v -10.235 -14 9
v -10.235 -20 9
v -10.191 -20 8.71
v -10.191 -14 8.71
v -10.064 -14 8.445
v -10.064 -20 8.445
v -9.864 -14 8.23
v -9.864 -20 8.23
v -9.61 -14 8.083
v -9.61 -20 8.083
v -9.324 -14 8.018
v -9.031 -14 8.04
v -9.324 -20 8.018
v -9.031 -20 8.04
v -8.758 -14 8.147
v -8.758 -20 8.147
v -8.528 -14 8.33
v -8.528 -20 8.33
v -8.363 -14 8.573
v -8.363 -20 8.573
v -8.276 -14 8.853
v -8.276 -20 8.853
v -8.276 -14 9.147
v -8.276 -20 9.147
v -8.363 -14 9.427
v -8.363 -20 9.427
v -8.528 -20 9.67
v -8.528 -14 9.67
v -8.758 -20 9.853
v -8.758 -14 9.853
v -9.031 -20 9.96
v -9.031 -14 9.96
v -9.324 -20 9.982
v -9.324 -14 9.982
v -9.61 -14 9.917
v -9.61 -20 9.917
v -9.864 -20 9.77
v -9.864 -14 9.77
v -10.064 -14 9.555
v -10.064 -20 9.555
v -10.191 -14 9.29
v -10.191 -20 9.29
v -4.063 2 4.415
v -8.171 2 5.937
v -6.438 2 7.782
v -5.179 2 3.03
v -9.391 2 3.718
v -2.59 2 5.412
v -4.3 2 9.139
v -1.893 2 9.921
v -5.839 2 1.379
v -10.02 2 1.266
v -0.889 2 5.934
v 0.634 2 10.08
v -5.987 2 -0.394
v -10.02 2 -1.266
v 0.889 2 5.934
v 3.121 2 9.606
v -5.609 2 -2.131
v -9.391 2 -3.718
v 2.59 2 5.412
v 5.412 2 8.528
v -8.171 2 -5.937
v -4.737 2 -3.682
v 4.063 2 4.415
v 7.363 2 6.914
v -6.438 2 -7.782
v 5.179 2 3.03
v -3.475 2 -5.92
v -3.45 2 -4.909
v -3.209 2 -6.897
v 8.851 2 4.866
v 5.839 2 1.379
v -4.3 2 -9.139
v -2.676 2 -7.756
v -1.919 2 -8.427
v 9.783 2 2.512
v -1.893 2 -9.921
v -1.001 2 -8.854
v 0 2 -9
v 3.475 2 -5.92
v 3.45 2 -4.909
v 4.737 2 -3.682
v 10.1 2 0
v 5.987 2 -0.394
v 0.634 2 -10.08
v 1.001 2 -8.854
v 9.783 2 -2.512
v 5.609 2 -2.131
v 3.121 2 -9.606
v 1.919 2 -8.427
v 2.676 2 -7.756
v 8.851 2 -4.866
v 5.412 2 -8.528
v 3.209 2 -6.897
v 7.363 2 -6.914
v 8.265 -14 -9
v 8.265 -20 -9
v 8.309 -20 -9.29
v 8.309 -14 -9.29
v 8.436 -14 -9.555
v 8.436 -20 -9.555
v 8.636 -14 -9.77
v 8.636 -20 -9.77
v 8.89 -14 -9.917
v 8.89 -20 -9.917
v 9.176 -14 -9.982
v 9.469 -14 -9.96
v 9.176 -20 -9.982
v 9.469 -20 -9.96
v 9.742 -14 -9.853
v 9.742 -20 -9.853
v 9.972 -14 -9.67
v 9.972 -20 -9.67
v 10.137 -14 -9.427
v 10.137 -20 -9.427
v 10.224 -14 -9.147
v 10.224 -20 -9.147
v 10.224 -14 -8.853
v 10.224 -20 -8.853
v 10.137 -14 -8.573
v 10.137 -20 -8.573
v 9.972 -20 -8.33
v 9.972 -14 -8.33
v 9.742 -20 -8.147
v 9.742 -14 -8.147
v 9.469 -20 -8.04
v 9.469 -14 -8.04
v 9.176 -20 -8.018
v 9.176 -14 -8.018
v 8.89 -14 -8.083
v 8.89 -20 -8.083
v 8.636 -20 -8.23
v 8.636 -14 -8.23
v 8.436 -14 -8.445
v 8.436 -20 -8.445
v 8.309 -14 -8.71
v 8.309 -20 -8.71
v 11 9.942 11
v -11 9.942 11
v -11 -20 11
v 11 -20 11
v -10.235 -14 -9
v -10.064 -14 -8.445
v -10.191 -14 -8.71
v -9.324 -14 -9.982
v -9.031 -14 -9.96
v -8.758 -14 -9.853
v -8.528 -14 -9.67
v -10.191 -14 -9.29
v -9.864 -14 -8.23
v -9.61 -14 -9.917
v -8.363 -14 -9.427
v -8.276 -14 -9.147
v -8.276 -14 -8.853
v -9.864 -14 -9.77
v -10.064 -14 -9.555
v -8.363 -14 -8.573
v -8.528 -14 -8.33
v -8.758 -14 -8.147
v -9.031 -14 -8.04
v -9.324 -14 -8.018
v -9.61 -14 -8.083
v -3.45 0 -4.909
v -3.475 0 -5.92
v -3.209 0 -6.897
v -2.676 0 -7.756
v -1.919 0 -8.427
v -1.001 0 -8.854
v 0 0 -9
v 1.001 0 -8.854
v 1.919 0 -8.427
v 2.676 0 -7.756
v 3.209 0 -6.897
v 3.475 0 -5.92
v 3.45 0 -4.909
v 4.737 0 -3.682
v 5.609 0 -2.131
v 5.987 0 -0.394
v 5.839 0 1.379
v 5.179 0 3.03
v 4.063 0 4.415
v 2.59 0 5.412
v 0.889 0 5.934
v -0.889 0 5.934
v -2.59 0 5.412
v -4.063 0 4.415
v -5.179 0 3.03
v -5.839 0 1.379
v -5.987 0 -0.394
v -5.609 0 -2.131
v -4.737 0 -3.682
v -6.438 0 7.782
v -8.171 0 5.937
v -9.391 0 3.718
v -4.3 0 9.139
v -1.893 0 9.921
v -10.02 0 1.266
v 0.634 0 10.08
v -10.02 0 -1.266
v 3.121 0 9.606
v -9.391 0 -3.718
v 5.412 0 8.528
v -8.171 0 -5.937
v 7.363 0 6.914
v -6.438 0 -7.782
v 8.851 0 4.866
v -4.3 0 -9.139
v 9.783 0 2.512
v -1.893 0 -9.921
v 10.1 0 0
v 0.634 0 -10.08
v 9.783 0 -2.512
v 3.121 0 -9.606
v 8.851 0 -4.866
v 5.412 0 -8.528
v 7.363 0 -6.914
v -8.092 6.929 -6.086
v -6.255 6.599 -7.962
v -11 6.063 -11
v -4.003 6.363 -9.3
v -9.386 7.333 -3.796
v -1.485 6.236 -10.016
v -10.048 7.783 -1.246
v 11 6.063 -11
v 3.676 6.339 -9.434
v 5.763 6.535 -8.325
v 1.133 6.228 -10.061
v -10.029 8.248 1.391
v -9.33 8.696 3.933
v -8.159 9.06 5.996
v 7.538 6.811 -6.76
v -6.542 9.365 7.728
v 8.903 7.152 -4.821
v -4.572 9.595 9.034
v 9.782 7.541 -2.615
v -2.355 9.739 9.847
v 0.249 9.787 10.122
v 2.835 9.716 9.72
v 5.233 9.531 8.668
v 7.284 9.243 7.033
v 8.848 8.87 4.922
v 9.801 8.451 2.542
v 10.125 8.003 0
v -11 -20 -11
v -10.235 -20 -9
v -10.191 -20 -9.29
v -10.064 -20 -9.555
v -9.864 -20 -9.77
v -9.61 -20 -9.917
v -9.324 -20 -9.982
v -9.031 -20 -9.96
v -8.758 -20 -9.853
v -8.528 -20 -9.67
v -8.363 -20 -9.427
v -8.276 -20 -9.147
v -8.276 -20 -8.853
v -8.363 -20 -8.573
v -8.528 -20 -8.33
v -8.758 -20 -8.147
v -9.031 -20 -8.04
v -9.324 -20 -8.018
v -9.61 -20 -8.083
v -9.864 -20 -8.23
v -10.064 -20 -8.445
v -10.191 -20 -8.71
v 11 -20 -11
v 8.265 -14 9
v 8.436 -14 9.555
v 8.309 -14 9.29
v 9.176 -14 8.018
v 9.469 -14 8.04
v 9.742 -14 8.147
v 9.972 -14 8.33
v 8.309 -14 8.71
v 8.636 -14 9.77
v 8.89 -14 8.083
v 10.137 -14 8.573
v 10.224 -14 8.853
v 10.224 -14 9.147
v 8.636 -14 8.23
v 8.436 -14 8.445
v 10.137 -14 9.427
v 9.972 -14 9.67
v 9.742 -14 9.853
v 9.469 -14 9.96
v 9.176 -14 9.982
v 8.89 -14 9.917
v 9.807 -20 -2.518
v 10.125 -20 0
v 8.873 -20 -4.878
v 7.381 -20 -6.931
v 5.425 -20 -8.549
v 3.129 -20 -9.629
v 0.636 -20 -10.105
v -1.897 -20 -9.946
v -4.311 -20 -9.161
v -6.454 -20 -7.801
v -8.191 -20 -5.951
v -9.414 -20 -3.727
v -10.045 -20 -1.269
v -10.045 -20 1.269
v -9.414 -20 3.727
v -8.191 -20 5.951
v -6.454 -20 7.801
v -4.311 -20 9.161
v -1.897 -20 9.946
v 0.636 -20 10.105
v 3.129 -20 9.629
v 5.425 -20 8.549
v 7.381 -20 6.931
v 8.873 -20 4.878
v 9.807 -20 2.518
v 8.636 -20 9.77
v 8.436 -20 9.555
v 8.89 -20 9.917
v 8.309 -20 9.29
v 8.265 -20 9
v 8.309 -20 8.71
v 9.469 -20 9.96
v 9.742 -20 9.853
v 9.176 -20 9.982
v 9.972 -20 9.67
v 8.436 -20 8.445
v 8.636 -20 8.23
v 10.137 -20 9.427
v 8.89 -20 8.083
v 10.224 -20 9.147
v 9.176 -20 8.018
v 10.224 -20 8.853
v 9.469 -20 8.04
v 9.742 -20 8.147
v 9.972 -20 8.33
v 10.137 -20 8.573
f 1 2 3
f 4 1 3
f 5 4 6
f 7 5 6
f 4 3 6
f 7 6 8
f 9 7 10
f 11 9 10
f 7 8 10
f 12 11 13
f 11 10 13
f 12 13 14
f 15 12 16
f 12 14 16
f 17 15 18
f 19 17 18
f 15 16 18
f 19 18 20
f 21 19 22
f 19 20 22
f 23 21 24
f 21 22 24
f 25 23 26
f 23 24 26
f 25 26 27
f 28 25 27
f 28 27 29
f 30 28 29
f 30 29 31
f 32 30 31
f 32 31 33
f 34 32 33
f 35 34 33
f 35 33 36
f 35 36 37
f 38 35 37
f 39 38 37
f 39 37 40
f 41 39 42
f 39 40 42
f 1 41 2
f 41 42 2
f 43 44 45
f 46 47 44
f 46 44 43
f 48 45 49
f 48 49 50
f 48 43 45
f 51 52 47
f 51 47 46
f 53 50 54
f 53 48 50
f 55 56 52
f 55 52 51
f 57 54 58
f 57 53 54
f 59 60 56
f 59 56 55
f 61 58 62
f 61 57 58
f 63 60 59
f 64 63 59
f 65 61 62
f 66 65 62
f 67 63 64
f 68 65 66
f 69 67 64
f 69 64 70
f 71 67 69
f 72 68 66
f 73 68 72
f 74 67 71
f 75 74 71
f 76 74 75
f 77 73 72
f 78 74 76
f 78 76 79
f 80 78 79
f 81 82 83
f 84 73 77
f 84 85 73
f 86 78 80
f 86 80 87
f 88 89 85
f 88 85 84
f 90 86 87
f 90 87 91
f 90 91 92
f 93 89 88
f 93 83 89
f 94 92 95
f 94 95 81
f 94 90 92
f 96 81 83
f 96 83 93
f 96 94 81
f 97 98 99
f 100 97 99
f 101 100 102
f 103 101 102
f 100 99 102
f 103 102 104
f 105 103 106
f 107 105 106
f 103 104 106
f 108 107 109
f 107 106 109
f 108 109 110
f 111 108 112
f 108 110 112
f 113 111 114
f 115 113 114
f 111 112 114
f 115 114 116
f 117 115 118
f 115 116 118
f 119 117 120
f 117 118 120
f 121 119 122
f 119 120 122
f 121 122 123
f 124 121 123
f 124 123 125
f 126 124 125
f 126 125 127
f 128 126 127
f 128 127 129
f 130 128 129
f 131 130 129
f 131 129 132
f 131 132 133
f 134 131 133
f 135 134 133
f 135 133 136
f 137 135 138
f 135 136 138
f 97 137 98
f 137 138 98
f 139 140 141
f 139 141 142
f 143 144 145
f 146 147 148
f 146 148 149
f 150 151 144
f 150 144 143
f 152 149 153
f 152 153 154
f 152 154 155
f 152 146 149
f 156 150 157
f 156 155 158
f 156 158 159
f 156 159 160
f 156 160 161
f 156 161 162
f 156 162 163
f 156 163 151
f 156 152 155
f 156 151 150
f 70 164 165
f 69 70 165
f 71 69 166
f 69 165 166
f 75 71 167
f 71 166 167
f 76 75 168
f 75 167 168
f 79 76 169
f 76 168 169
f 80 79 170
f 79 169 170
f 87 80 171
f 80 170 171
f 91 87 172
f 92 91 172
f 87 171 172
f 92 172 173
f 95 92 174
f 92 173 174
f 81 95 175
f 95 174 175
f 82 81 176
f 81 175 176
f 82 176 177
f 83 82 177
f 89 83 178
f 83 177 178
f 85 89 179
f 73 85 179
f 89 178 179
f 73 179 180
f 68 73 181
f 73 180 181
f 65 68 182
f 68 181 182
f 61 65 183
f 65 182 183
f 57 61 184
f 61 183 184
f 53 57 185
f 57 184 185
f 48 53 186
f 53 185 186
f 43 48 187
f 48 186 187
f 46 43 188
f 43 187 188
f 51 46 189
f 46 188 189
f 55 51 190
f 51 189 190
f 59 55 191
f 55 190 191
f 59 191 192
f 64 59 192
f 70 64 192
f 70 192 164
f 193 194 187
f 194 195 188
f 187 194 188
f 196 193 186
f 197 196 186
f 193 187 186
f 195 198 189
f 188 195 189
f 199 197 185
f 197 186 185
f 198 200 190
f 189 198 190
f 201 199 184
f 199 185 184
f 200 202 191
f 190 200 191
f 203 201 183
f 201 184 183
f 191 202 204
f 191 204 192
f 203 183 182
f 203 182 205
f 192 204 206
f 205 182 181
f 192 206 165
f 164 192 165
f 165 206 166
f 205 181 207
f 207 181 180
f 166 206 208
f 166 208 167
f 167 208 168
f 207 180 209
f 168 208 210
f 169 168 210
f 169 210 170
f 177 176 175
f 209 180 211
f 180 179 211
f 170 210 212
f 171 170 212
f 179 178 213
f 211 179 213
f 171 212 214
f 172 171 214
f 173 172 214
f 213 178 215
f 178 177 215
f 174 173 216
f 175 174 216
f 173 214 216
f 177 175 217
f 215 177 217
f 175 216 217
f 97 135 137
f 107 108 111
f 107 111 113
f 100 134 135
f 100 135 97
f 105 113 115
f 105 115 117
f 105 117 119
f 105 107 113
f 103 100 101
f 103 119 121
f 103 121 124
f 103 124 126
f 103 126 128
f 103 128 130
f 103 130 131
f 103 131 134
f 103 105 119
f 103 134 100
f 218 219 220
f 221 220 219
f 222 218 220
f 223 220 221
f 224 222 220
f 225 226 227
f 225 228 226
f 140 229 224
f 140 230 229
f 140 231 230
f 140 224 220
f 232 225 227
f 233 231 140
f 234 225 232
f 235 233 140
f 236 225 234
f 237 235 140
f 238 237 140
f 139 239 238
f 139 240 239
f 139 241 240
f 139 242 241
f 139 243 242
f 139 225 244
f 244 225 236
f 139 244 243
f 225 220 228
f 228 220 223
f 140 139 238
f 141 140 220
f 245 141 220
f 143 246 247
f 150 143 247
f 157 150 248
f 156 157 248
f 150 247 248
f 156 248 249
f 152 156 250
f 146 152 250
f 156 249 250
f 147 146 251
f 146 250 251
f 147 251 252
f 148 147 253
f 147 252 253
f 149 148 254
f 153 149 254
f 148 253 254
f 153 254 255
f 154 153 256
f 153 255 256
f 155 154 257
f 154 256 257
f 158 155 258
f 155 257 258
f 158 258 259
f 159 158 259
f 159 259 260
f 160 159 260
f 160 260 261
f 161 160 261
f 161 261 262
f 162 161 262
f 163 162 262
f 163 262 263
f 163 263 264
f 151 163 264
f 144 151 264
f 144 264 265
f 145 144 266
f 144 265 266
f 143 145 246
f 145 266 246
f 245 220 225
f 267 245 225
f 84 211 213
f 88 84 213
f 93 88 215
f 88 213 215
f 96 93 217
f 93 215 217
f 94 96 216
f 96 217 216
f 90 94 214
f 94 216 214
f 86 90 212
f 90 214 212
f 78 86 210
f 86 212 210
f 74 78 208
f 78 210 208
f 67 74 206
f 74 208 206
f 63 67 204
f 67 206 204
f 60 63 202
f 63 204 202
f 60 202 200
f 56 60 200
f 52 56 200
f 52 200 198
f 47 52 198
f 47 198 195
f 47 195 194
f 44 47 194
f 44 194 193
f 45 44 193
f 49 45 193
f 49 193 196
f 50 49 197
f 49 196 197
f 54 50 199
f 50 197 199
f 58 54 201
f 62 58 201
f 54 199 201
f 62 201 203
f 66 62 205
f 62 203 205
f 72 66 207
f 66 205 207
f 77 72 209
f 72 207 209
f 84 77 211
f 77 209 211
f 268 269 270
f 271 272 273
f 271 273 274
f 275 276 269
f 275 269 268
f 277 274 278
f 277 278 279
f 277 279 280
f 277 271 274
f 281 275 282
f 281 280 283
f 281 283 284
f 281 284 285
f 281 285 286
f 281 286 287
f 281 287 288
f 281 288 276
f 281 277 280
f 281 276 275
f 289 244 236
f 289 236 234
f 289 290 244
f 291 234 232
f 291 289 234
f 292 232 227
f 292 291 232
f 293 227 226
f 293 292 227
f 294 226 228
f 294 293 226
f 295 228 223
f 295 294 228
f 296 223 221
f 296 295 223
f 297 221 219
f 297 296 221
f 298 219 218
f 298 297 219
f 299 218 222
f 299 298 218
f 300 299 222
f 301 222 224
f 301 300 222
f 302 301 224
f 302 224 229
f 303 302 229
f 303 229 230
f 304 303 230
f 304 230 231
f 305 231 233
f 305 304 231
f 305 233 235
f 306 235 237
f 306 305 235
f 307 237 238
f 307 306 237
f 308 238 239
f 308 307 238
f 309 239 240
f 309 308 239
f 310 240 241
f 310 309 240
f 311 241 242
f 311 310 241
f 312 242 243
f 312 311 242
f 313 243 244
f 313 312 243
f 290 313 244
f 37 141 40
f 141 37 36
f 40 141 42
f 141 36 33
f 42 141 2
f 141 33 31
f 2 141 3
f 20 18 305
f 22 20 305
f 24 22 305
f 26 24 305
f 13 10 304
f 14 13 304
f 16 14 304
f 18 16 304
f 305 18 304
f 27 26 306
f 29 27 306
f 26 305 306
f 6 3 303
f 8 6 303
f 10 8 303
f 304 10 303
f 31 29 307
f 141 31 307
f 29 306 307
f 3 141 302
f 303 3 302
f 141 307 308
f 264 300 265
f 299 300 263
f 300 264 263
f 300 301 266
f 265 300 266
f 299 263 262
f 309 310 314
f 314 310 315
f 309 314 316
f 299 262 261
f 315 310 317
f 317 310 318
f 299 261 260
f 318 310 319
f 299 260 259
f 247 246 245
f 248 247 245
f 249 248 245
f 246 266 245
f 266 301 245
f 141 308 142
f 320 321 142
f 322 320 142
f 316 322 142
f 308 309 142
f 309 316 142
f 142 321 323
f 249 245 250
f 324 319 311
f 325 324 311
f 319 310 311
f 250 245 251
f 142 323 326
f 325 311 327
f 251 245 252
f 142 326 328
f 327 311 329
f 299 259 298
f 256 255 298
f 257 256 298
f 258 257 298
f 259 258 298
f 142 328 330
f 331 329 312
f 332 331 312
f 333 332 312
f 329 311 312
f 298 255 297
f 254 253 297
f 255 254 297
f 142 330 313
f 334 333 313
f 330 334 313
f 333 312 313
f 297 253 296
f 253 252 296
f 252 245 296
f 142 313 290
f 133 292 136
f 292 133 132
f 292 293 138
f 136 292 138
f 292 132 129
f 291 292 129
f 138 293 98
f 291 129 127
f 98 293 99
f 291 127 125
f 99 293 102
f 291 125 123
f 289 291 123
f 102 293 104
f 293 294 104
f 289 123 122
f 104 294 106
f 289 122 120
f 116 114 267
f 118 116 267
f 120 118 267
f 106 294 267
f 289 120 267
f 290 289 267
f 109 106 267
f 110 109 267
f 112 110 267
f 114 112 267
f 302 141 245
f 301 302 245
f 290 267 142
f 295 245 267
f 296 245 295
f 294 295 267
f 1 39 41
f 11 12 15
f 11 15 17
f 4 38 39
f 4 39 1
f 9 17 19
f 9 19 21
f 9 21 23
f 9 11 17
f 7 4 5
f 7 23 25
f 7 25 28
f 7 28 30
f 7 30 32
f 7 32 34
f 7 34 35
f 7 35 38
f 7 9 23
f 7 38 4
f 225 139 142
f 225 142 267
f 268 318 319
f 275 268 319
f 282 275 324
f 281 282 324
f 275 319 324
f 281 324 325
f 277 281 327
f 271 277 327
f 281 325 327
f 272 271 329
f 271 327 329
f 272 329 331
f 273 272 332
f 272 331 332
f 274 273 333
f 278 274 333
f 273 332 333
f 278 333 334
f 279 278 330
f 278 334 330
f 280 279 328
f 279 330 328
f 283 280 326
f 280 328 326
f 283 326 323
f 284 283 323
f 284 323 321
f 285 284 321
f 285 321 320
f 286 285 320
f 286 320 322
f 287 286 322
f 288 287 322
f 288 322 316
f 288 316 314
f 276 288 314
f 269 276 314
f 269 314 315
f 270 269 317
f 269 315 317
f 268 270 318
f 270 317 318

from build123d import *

# Parameters (mm, degrees)
SKETCH2_R                = 10.1
BOSS_EXTRUDE1_DEPTH      = 2
SKETCH3_W                = 22
SKETCH3_H                = 22
SKETCH3_R                = 10.125
BOSS_EXTRUDE2_DEPTH      = 8
BOSS_EXTRUDE2_DEPTH_BACK = 22
SKETCH5_R                = 0.985
CUT_EXTRUDE2_DEPTH       = 6
CUT_EXTRUDE3_DEPTH       = 23


with BuildPart() as part:
    # Sketch2 → Boss-Extrude1 (new body)
    with BuildSketch(Plane(origin=(0, 0, 0), x_dir=(1, 0, 0), z_dir=(0, 1, 0))):
        Circle(SKETCH2_R)
        with BuildLine():
            ThreePointArc((-3.449757447, 4.909090909), (0, 9), (3.449757447, 4.909090909))
            ThreePointArc((3.449757447, 4.909090909), (0, -6), (-3.449757447, 4.909090909))
        make_face(mode=Mode.SUBTRACT)
    extrude(amount=BOSS_EXTRUDE1_DEPTH)


with BuildPart() as body_2:
    # Sketch3 → Boss-Extrude2 (new body, two sides)
    with BuildSketch(Plane(origin=(0, 2, 0), x_dir=(1, 0, 0), z_dir=(0, 1, 0))) as boss_extrude2_sk:
        Rectangle(SKETCH3_W, SKETCH3_H)
        Circle(SKETCH3_R, mode=Mode.SUBTRACT)
    extrude(amount=BOSS_EXTRUDE2_DEPTH)
    extrude(boss_extrude2_sk.sketch, amount=-BOSS_EXTRUDE2_DEPTH_BACK)

    # Sketch5 → Cut-Extrude2 (cut)
    with BuildSketch(Plane(origin=(0, -20, 0), x_dir=(-1, 0, 0), z_dir=(0, -1, 0))):
        with Locations((9.25, -9)):
            Circle(SKETCH5_R)
        with Locations((9.25, 9)):
            Circle(SKETCH5_R)
        with Locations((-9.25, 9)):
            Circle(SKETCH5_R)
        with Locations((-9.25, -9)):
            Circle(SKETCH5_R)
    extrude(amount=-CUT_EXTRUDE2_DEPTH, mode=Mode.SUBTRACT)

    # Sketch6 → Cut-Extrude3 (cut, through all)
    with BuildSketch(Plane(origin=(11, 0, 0), x_dir=(0, 0, -1), z_dir=(1, 0, 0))):
        Polygon((11, 6.06291723), (-11, 9.942110806), (-11, 10), (11, 10), align=None)
    extrude(amount=-CUT_EXTRUDE3_DEPTH, mode=Mode.SUBTRACT)


solid = Compound([part.part, body_2.part])
